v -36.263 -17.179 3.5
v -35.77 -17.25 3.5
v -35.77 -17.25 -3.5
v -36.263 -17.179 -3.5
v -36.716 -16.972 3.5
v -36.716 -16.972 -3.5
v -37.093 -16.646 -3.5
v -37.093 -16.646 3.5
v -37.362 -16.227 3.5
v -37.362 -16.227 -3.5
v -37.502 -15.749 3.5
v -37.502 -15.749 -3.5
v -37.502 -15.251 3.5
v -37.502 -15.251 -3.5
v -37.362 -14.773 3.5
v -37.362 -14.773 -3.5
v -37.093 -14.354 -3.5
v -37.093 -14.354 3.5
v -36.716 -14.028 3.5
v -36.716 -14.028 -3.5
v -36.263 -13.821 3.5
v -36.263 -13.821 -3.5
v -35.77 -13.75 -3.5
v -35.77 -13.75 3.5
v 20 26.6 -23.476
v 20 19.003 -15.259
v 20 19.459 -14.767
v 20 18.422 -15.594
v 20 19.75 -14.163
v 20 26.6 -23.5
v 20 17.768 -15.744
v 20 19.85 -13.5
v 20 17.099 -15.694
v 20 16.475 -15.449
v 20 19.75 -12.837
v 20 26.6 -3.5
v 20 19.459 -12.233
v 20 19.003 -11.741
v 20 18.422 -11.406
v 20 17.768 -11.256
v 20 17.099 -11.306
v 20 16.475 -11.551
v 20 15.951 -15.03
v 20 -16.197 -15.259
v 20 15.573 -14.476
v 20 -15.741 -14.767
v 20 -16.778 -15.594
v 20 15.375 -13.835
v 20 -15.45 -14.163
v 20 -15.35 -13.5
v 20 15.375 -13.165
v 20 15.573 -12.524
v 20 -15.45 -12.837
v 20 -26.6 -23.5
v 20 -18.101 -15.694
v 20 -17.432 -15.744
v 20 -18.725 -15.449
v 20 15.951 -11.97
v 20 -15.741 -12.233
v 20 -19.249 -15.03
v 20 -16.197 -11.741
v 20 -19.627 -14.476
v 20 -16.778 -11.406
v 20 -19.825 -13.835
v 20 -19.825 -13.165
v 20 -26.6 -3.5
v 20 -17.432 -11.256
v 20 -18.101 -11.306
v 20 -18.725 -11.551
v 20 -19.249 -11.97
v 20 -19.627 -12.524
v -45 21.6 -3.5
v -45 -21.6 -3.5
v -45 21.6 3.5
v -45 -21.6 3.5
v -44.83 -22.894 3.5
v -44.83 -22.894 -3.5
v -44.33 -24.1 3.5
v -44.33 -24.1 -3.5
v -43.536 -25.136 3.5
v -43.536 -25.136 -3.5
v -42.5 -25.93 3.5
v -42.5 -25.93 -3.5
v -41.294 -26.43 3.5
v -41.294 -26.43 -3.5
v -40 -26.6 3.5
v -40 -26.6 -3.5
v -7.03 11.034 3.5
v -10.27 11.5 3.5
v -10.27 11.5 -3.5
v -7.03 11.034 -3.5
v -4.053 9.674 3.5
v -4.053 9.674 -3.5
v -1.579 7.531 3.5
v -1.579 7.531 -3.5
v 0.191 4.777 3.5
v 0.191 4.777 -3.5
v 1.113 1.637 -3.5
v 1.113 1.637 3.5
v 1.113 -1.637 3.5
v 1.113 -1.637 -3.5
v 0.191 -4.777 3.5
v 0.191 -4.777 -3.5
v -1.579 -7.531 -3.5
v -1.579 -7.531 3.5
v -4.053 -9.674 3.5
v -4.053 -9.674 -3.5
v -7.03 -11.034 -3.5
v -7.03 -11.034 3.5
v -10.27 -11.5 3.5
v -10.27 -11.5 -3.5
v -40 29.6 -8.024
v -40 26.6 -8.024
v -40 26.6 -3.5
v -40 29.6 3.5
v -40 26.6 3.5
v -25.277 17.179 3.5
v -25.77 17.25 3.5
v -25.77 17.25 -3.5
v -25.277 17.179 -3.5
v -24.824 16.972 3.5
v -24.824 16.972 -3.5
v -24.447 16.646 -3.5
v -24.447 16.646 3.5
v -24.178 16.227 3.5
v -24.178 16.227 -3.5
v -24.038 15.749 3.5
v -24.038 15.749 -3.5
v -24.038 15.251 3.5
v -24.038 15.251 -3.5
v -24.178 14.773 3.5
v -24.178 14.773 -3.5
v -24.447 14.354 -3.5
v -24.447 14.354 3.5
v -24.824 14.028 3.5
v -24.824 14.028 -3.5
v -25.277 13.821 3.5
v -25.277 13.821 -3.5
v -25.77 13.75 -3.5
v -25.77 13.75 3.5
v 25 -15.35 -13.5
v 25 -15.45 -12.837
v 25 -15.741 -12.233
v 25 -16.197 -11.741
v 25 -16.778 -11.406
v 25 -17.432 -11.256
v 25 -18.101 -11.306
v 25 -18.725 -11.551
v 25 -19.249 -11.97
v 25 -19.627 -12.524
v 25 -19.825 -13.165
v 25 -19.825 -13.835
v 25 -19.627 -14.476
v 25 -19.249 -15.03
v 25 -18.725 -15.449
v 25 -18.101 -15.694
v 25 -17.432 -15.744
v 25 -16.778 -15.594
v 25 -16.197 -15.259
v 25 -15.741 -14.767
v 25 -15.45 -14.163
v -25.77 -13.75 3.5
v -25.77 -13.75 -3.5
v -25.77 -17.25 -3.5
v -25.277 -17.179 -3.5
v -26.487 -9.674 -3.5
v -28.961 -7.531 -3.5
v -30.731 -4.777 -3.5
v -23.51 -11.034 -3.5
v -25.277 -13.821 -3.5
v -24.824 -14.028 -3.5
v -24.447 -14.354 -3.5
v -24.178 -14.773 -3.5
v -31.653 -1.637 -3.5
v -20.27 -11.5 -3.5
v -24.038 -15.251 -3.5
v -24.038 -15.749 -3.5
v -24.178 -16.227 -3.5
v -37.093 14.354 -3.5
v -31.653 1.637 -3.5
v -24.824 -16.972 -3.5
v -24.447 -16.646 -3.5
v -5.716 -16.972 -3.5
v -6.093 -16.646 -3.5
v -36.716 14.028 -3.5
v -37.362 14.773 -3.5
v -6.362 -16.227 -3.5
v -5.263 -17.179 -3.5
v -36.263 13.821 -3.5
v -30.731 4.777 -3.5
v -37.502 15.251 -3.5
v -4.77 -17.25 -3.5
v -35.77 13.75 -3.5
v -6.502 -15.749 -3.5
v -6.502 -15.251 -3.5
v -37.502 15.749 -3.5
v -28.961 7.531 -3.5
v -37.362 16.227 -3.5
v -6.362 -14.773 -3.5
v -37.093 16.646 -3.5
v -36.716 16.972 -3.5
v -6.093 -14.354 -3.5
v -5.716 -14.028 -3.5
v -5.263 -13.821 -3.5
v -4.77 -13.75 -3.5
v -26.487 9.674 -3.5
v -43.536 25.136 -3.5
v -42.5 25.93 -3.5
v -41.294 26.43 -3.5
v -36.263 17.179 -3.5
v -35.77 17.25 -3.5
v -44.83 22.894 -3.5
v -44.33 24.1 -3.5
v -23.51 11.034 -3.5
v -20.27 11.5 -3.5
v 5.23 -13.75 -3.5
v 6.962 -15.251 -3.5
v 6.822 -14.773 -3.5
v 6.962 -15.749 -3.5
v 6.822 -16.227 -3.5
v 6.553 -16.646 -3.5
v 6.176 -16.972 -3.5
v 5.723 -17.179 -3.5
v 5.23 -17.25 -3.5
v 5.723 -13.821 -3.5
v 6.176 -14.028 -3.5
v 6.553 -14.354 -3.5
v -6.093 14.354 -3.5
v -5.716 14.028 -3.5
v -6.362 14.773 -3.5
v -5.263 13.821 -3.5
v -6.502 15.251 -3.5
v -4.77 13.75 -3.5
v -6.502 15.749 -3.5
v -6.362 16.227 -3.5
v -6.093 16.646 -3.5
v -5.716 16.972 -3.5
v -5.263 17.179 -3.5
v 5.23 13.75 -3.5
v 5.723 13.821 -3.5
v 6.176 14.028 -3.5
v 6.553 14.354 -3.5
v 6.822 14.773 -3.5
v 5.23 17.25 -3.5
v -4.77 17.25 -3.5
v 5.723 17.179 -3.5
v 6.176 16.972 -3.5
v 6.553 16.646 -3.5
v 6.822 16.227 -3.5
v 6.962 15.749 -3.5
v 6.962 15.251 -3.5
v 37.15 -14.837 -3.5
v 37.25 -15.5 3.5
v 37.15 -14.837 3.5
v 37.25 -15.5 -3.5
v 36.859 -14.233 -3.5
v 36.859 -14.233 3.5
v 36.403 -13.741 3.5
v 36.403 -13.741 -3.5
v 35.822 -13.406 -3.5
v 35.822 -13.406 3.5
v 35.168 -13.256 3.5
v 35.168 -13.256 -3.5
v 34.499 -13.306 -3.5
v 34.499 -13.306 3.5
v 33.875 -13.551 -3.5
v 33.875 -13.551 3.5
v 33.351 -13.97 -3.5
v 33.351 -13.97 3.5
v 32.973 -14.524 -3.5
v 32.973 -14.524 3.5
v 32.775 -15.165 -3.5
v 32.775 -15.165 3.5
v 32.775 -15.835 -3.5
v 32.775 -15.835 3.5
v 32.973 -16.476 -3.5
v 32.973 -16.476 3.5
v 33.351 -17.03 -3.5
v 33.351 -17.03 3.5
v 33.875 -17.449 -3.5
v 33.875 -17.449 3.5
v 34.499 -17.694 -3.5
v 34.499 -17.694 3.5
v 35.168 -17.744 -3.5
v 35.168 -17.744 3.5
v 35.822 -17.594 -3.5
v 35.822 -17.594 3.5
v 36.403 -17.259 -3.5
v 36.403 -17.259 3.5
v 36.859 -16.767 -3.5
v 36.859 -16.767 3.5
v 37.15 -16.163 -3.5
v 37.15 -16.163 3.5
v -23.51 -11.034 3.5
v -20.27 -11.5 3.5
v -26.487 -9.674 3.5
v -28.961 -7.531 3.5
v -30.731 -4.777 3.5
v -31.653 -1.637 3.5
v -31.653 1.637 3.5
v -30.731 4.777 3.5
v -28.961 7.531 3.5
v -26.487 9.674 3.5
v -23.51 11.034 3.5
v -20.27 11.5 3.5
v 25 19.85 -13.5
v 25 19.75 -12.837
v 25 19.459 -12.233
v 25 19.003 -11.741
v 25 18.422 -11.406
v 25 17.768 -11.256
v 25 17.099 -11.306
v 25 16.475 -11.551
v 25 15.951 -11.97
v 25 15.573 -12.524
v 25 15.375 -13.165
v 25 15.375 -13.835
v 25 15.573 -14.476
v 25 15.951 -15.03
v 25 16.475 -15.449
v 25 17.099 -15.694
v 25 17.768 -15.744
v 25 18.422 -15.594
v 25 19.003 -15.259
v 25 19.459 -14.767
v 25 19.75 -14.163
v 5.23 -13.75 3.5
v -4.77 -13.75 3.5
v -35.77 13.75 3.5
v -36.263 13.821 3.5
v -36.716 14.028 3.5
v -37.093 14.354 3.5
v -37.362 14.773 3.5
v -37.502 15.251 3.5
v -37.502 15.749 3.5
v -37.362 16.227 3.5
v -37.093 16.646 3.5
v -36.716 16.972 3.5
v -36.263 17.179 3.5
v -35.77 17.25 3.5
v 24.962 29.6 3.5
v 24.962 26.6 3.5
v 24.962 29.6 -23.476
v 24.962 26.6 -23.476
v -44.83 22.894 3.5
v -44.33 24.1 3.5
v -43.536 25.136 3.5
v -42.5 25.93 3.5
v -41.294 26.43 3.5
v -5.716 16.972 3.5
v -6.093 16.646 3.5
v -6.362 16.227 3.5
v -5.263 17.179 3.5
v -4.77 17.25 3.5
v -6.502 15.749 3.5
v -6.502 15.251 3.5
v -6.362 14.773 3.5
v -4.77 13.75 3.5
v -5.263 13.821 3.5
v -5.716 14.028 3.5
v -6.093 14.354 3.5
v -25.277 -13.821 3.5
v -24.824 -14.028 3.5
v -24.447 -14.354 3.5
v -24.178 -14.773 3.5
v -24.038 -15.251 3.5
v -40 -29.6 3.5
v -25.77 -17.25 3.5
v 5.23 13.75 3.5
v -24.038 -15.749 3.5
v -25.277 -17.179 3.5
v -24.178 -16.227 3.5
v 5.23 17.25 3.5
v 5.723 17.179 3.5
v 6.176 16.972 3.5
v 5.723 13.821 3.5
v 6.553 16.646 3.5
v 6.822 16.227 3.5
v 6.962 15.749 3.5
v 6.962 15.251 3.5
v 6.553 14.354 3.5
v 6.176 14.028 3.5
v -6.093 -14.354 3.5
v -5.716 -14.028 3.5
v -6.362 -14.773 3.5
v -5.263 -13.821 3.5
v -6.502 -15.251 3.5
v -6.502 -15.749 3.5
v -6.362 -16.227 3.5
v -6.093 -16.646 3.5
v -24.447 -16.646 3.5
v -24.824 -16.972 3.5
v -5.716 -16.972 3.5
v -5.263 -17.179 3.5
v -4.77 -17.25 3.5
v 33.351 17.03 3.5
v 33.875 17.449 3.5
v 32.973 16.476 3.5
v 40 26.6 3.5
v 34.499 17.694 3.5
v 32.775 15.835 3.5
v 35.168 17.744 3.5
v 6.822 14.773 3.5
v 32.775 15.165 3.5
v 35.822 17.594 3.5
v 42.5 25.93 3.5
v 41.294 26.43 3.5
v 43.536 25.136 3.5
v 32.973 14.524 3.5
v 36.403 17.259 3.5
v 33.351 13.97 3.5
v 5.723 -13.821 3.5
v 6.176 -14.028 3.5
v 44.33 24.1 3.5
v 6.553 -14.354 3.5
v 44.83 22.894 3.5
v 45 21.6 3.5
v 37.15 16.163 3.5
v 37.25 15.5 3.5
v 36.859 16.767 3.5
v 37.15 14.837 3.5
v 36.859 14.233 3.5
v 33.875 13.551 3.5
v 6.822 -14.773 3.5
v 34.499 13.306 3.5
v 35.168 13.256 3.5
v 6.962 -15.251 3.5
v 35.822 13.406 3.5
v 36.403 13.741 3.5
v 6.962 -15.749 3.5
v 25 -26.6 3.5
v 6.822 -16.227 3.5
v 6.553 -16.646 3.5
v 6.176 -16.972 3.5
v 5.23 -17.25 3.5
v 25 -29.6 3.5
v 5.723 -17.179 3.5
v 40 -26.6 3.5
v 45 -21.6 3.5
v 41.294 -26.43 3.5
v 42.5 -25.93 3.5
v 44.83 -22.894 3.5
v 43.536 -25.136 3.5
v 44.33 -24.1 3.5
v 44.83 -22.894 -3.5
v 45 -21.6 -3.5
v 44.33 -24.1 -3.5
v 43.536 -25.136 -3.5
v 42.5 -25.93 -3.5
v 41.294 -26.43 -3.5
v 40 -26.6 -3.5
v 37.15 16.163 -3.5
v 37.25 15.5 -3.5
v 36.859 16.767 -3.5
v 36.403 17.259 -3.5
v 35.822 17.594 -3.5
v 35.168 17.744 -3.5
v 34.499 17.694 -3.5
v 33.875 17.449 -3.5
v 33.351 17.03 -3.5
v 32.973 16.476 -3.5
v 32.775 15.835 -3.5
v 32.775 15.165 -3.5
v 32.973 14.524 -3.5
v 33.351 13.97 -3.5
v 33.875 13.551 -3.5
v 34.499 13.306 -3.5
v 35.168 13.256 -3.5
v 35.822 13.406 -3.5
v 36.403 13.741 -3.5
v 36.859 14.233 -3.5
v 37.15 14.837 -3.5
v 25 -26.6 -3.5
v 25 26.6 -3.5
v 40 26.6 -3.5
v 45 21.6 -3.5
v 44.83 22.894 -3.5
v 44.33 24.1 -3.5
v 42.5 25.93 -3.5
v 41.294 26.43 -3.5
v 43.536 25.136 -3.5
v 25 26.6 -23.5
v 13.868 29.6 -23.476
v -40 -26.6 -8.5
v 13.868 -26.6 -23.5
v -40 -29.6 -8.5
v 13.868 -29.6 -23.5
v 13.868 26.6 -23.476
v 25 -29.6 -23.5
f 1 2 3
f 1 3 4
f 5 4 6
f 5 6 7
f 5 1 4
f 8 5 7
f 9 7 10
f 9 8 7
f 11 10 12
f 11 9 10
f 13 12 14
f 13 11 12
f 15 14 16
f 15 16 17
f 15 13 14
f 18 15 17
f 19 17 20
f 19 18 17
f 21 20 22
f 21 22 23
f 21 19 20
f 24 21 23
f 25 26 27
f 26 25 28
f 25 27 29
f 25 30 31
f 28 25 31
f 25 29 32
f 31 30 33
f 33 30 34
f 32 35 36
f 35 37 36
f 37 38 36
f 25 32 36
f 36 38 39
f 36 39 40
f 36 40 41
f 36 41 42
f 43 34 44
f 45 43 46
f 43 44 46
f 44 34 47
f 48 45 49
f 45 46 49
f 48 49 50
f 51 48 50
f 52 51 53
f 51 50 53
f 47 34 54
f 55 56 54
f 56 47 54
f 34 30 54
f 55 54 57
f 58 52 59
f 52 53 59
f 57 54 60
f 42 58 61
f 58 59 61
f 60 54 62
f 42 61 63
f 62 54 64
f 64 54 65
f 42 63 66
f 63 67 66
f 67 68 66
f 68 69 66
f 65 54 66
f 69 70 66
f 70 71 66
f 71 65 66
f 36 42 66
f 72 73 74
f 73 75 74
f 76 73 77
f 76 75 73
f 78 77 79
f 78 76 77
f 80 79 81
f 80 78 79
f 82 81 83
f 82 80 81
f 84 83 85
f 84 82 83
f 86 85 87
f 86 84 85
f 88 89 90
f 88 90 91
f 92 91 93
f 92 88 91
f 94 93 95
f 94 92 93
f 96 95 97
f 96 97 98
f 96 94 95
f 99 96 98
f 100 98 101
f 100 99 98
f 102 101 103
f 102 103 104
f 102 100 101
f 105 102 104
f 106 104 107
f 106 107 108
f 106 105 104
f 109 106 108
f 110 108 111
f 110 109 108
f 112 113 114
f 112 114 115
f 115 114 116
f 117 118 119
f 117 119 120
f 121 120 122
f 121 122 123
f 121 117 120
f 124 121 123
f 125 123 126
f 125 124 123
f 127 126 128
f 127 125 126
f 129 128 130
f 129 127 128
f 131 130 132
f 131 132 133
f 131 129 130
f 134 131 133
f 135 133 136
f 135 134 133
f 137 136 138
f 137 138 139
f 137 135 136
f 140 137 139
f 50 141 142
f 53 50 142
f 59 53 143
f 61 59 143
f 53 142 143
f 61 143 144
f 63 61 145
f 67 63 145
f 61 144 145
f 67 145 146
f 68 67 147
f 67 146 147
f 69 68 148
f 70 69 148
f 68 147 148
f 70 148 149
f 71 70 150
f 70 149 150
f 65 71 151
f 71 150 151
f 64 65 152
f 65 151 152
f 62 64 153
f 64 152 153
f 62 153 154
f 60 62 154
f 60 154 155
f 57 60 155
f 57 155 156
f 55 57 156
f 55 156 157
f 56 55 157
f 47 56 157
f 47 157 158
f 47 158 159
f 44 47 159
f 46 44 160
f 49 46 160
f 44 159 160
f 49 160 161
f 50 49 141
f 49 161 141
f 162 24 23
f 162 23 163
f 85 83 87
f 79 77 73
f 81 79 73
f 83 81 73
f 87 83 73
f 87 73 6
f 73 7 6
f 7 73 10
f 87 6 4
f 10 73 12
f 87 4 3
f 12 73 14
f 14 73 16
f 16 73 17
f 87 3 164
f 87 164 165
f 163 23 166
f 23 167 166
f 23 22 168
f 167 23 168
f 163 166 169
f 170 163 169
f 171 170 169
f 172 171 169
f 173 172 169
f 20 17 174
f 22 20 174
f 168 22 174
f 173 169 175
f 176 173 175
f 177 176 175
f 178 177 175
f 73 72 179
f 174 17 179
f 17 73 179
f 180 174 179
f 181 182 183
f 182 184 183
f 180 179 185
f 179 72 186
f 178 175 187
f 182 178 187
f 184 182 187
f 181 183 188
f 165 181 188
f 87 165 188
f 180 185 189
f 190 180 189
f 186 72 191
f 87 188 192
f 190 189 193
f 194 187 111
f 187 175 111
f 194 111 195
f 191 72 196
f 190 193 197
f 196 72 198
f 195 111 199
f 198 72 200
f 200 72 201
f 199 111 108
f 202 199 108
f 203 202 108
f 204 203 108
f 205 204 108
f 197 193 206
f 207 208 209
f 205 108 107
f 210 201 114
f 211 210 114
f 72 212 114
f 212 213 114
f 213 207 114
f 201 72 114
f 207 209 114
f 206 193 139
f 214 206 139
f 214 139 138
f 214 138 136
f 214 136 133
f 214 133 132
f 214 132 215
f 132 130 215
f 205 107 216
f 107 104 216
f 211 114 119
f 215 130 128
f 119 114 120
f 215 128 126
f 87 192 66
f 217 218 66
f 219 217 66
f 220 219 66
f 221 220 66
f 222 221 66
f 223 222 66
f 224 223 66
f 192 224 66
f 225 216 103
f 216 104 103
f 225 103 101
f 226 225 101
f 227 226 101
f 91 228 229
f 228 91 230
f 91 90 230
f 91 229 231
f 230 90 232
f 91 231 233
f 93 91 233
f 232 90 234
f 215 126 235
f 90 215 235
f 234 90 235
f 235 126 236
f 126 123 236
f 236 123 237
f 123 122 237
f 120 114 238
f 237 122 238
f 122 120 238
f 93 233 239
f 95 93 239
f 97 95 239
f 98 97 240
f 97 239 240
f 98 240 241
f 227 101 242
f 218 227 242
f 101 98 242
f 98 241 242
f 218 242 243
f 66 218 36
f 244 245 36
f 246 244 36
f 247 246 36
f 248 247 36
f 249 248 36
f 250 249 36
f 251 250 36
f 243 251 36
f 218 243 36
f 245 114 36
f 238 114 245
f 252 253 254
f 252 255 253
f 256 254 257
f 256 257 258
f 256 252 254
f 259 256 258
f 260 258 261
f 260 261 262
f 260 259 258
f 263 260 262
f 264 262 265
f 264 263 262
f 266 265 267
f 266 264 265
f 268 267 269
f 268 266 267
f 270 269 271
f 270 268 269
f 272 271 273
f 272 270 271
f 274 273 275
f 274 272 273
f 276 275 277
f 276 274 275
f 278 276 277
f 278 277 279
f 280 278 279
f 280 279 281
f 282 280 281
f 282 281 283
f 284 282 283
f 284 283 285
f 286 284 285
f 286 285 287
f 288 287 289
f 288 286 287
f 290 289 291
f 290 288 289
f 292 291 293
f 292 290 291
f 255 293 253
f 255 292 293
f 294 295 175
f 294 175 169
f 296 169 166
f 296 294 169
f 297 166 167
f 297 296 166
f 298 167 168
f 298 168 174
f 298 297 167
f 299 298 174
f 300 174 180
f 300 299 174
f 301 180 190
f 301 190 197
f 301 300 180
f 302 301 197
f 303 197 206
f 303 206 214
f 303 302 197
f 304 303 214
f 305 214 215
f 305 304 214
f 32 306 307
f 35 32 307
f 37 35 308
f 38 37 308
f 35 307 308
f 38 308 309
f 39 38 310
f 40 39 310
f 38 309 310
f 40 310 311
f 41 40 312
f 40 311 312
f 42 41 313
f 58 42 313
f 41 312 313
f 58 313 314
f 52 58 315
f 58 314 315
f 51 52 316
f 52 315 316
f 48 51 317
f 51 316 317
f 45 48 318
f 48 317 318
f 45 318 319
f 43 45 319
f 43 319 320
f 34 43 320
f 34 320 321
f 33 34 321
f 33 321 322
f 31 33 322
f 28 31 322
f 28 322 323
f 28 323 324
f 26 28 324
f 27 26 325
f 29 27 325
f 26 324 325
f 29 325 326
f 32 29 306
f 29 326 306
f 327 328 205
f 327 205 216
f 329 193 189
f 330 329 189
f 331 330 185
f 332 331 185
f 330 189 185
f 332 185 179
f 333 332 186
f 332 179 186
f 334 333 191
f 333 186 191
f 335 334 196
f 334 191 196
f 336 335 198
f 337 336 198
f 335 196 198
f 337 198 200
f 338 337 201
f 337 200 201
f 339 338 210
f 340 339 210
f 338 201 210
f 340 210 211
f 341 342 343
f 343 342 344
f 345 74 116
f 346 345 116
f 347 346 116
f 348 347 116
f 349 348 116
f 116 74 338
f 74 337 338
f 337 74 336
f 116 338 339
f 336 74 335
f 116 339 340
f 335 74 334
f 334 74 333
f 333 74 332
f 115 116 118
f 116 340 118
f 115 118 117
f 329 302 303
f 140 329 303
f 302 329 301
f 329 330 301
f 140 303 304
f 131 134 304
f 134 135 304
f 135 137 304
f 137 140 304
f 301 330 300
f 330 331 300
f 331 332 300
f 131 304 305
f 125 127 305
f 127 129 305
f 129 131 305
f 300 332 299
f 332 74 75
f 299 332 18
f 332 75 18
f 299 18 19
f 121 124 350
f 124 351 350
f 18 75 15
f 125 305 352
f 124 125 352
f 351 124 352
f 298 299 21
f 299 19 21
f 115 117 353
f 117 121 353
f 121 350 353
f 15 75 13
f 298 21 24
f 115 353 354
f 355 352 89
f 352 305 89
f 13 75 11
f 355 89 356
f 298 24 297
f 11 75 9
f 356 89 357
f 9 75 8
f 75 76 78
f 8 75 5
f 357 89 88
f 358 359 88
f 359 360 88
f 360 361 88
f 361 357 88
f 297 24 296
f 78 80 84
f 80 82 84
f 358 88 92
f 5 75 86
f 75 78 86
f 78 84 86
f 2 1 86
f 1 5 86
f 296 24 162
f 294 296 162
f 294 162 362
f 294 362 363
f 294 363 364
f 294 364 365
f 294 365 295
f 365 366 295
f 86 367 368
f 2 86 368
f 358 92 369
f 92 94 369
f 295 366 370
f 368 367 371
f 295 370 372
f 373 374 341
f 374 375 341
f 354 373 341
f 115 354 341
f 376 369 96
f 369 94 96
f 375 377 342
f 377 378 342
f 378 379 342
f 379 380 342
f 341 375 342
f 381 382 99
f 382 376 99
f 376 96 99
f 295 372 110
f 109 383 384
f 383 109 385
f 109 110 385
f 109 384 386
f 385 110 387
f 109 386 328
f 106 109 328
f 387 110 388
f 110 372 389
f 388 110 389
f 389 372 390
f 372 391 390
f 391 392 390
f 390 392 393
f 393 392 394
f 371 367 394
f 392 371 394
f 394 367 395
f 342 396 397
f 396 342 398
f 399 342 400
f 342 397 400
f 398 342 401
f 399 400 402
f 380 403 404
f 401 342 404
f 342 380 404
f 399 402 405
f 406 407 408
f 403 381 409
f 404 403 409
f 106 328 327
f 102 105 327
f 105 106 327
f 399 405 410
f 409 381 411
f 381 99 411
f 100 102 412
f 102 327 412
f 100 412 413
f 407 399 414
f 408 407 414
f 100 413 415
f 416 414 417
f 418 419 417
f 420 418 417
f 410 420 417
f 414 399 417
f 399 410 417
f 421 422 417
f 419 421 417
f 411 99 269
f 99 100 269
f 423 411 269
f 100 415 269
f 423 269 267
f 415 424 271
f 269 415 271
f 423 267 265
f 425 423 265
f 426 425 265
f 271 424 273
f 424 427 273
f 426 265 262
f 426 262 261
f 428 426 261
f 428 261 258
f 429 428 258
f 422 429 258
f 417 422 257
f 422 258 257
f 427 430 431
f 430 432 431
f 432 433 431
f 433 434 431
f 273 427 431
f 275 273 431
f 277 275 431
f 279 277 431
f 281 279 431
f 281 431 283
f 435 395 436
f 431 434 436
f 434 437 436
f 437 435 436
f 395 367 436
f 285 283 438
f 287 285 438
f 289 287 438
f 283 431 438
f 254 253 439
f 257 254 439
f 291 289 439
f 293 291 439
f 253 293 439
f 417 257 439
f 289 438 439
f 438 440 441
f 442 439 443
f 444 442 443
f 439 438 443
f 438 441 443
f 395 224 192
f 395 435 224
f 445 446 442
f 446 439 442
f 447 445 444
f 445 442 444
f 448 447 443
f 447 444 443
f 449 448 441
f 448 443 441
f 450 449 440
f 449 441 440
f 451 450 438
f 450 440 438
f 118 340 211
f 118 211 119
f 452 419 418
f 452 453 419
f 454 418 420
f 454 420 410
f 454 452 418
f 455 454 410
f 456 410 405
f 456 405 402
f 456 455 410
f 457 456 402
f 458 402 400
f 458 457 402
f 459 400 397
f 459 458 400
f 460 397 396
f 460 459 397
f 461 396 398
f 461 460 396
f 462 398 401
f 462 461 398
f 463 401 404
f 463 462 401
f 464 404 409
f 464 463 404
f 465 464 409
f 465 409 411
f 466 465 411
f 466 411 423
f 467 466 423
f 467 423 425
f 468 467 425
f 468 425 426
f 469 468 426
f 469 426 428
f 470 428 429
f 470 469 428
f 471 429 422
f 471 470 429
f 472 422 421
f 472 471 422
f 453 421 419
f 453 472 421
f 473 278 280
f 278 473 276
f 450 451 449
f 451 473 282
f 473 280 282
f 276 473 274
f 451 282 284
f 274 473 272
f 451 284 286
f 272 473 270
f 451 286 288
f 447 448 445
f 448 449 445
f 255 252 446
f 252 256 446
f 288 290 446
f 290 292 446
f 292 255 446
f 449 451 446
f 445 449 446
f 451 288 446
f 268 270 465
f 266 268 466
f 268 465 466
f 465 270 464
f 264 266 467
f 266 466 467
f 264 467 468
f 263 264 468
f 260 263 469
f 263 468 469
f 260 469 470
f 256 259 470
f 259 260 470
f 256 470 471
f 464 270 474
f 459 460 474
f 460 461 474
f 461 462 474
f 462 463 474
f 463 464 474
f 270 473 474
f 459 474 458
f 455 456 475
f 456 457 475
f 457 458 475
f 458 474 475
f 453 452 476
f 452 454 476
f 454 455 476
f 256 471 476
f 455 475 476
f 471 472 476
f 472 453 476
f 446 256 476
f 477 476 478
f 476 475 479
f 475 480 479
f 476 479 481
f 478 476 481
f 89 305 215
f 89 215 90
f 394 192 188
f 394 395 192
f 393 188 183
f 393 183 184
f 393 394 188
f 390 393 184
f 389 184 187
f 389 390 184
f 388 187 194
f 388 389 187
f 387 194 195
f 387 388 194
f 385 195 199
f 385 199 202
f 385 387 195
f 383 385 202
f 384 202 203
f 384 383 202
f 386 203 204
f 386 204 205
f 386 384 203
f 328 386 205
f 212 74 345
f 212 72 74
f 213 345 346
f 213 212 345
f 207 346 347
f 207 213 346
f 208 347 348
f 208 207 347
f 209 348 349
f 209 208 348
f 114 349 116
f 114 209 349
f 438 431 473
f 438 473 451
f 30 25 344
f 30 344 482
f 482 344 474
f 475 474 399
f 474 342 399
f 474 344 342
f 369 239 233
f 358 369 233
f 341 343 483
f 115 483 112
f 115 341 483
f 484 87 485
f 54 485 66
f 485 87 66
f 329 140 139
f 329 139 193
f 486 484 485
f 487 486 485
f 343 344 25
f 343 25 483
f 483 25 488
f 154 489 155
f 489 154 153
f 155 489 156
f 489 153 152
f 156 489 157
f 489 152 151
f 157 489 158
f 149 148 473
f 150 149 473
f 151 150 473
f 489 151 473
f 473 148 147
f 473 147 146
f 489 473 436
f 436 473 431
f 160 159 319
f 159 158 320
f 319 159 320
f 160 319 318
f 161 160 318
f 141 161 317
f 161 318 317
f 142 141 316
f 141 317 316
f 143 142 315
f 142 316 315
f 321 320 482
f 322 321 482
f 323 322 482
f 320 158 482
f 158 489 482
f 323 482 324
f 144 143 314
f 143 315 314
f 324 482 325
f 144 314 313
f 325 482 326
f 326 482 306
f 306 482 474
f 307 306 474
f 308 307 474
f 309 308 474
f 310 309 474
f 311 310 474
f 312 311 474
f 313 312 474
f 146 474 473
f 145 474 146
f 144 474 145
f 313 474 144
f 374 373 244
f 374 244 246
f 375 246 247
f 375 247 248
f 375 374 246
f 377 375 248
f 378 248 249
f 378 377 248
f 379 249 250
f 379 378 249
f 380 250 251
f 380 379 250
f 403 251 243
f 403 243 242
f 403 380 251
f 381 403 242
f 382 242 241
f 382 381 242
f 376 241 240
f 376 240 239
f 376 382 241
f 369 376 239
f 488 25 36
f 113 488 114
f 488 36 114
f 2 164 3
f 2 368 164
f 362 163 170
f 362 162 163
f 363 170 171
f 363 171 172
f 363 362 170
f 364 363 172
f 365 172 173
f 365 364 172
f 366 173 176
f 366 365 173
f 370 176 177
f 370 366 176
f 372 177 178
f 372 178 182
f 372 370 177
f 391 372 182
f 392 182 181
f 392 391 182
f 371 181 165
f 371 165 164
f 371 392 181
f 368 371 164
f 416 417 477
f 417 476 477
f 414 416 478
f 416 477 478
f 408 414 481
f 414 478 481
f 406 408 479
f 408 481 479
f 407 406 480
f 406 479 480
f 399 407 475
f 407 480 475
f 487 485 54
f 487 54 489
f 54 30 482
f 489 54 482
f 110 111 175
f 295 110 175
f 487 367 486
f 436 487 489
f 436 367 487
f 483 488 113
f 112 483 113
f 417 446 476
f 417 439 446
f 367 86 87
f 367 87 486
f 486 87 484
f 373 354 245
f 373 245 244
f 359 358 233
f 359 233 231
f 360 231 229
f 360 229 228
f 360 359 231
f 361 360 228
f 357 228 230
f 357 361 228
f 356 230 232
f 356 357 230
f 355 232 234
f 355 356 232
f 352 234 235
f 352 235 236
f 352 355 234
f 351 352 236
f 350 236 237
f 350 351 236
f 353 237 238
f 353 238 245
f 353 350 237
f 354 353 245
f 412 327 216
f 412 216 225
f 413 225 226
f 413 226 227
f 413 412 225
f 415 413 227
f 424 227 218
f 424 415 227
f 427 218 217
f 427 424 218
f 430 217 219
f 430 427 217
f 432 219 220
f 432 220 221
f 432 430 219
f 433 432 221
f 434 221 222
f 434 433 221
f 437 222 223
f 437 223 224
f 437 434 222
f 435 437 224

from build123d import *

# Parameters (mm, degrees)
F0_W      = 90
F0_H      = 53.2
F0_R      = 2.25
F1_DEPTH  = 3.5
F2_R      = 5
F3_W      = 5
F3_H      = 20
F4_DEPTH  = 26.6
F6_DEPTH  = 3
F8_DEPTH  = 3
F9_R      = 2.25
F10_DEPTH = 5


with BuildPart() as f1:
    # F0 (on Top) → F1 (new body, symmetric)
    with BuildSketch(Plane.XY):
        Rectangle(F0_W, F0_H)
        with BuildLine():
            ThreePointArc((-35.77, -17.25), (-37.52, -15.5), (-35.77, -13.75))
            Line((-35.77, -13.75), (-25.77, -13.75))
            ThreePointArc((-25.77, -13.75), (-24.02, -15.5), (-25.77, -17.25))
            Line((-25.77, -17.25), (-35.77, -17.25))
        make_face(mode=Mode.SUBTRACT)
        with BuildLine():
            Line((-4.77, -13.75), (5.23, -13.75))
            ThreePointArc((5.23, -13.75), (6.98, -15.5), (5.23, -17.25))
            Line((5.23, -17.25), (-4.77, -17.25))
            ThreePointArc((-4.77, -17.25), (-6.52, -15.5), (-4.77, -13.75))
        make_face(mode=Mode.SUBTRACT)
        with Locations((35, -15.5)):
            Circle(F0_R, mode=Mode.SUBTRACT)
        with BuildLine():
            ThreePointArc((-10.27, 11.5), (1.23, 0), (-10.27, -11.5))
            Line((-10.27, -11.5), (-20.27, -11.5))
            ThreePointArc((-20.27, -11.5), (-31.77, 0), (-20.27, 11.5))
            Line((-20.27, 11.5), (-10.27, 11.5))
        make_face(mode=Mode.SUBTRACT)
        with BuildLine():
            Line((-25.77, 13.75), (-35.77, 13.75))
            ThreePointArc((-35.77, 13.75), (-37.52, 15.5), (-35.77, 17.25))
            Line((-35.77, 17.25), (-25.77, 17.25))
            ThreePointArc((-25.77, 17.25), (-24.02, 15.5), (-25.77, 13.75))
        make_face(mode=Mode.SUBTRACT)
        with BuildLine():
            ThreePointArc((5.23, 17.25), (6.98, 15.5), (5.23, 13.75))
            Line((5.23, 13.75), (-4.77, 13.75))
            ThreePointArc((-4.77, 13.75), (-6.52, 15.5), (-4.77, 17.25))
            Line((-4.77, 17.25), (5.23, 17.25))
        make_face(mode=Mode.SUBTRACT)
        with Locations((35, 15.5)):
            Circle(F0_R, mode=Mode.SUBTRACT)
    extrude(amount=F1_DEPTH, both=True)

    # F2
    f2_edges = [f1.edges().sort_by_distance(p)[0] for p in [
        (-45, 26.6, 0),
        (-45, -26.6, 0),
        (45, -26.6, 0),
        (45, 26.6, 0),
    ]]
    fillet(f2_edges, radius=F2_R)

    # F3 (on Front) → F4 (join, symmetric)
    with BuildSketch(Plane.XZ):
        with Locations((22.5, -13.5)):
            Rectangle(F3_W, F3_H)
    extrude(amount=F4_DEPTH, both=True)

    # F5 (on face) → F6 (join)
    with BuildSketch(Plane.XZ.offset(26.6)):
        Polygon((13.8679239899, -23.5), (20, -23.5), (20, -3.5), (-40, -3.5), (-40, -8.5), align=None)
        Polygon((20, -23.5), (25, -23.5), (25, -3.5), (25, 3.5), (-40, 3.5), (-40, -3.5), (20, -3.5), align=None)
    extrude(amount=F6_DEPTH)

    # F7 (on face) → F8 (join)
    with BuildSketch(Plane(origin=(0, 26.6, 0), x_dir=(-1, 0, 0), z_dir=(0, 1, 0))):
        Polygon((-24.9622650445, 3.5), (-24.9622650445, -23.4764143825), (-20, -23.4764143825), (-20, -3.5), (40, -3.5), (40, 3.5), align=None)
        Polygon((-20, -3.5), (-20, -23.4764143825), (-13.8679249212, -23.4764143825), (40, -8.0235851929), (40, -3.5), align=None)
    extrude(amount=F8_DEPTH)

    # F9 (on face) → F10 (cut, through all)
    with BuildSketch(Plane.YZ.offset(25)):
        with Locations((-17.6, -13.5)):
            Circle(F9_R)
        with Locations((17.6, -13.5)):
            Circle(F9_R)
    extrude(amount=-F10_DEPTH, mode=Mode.SUBTRACT)


solid = f1.part
